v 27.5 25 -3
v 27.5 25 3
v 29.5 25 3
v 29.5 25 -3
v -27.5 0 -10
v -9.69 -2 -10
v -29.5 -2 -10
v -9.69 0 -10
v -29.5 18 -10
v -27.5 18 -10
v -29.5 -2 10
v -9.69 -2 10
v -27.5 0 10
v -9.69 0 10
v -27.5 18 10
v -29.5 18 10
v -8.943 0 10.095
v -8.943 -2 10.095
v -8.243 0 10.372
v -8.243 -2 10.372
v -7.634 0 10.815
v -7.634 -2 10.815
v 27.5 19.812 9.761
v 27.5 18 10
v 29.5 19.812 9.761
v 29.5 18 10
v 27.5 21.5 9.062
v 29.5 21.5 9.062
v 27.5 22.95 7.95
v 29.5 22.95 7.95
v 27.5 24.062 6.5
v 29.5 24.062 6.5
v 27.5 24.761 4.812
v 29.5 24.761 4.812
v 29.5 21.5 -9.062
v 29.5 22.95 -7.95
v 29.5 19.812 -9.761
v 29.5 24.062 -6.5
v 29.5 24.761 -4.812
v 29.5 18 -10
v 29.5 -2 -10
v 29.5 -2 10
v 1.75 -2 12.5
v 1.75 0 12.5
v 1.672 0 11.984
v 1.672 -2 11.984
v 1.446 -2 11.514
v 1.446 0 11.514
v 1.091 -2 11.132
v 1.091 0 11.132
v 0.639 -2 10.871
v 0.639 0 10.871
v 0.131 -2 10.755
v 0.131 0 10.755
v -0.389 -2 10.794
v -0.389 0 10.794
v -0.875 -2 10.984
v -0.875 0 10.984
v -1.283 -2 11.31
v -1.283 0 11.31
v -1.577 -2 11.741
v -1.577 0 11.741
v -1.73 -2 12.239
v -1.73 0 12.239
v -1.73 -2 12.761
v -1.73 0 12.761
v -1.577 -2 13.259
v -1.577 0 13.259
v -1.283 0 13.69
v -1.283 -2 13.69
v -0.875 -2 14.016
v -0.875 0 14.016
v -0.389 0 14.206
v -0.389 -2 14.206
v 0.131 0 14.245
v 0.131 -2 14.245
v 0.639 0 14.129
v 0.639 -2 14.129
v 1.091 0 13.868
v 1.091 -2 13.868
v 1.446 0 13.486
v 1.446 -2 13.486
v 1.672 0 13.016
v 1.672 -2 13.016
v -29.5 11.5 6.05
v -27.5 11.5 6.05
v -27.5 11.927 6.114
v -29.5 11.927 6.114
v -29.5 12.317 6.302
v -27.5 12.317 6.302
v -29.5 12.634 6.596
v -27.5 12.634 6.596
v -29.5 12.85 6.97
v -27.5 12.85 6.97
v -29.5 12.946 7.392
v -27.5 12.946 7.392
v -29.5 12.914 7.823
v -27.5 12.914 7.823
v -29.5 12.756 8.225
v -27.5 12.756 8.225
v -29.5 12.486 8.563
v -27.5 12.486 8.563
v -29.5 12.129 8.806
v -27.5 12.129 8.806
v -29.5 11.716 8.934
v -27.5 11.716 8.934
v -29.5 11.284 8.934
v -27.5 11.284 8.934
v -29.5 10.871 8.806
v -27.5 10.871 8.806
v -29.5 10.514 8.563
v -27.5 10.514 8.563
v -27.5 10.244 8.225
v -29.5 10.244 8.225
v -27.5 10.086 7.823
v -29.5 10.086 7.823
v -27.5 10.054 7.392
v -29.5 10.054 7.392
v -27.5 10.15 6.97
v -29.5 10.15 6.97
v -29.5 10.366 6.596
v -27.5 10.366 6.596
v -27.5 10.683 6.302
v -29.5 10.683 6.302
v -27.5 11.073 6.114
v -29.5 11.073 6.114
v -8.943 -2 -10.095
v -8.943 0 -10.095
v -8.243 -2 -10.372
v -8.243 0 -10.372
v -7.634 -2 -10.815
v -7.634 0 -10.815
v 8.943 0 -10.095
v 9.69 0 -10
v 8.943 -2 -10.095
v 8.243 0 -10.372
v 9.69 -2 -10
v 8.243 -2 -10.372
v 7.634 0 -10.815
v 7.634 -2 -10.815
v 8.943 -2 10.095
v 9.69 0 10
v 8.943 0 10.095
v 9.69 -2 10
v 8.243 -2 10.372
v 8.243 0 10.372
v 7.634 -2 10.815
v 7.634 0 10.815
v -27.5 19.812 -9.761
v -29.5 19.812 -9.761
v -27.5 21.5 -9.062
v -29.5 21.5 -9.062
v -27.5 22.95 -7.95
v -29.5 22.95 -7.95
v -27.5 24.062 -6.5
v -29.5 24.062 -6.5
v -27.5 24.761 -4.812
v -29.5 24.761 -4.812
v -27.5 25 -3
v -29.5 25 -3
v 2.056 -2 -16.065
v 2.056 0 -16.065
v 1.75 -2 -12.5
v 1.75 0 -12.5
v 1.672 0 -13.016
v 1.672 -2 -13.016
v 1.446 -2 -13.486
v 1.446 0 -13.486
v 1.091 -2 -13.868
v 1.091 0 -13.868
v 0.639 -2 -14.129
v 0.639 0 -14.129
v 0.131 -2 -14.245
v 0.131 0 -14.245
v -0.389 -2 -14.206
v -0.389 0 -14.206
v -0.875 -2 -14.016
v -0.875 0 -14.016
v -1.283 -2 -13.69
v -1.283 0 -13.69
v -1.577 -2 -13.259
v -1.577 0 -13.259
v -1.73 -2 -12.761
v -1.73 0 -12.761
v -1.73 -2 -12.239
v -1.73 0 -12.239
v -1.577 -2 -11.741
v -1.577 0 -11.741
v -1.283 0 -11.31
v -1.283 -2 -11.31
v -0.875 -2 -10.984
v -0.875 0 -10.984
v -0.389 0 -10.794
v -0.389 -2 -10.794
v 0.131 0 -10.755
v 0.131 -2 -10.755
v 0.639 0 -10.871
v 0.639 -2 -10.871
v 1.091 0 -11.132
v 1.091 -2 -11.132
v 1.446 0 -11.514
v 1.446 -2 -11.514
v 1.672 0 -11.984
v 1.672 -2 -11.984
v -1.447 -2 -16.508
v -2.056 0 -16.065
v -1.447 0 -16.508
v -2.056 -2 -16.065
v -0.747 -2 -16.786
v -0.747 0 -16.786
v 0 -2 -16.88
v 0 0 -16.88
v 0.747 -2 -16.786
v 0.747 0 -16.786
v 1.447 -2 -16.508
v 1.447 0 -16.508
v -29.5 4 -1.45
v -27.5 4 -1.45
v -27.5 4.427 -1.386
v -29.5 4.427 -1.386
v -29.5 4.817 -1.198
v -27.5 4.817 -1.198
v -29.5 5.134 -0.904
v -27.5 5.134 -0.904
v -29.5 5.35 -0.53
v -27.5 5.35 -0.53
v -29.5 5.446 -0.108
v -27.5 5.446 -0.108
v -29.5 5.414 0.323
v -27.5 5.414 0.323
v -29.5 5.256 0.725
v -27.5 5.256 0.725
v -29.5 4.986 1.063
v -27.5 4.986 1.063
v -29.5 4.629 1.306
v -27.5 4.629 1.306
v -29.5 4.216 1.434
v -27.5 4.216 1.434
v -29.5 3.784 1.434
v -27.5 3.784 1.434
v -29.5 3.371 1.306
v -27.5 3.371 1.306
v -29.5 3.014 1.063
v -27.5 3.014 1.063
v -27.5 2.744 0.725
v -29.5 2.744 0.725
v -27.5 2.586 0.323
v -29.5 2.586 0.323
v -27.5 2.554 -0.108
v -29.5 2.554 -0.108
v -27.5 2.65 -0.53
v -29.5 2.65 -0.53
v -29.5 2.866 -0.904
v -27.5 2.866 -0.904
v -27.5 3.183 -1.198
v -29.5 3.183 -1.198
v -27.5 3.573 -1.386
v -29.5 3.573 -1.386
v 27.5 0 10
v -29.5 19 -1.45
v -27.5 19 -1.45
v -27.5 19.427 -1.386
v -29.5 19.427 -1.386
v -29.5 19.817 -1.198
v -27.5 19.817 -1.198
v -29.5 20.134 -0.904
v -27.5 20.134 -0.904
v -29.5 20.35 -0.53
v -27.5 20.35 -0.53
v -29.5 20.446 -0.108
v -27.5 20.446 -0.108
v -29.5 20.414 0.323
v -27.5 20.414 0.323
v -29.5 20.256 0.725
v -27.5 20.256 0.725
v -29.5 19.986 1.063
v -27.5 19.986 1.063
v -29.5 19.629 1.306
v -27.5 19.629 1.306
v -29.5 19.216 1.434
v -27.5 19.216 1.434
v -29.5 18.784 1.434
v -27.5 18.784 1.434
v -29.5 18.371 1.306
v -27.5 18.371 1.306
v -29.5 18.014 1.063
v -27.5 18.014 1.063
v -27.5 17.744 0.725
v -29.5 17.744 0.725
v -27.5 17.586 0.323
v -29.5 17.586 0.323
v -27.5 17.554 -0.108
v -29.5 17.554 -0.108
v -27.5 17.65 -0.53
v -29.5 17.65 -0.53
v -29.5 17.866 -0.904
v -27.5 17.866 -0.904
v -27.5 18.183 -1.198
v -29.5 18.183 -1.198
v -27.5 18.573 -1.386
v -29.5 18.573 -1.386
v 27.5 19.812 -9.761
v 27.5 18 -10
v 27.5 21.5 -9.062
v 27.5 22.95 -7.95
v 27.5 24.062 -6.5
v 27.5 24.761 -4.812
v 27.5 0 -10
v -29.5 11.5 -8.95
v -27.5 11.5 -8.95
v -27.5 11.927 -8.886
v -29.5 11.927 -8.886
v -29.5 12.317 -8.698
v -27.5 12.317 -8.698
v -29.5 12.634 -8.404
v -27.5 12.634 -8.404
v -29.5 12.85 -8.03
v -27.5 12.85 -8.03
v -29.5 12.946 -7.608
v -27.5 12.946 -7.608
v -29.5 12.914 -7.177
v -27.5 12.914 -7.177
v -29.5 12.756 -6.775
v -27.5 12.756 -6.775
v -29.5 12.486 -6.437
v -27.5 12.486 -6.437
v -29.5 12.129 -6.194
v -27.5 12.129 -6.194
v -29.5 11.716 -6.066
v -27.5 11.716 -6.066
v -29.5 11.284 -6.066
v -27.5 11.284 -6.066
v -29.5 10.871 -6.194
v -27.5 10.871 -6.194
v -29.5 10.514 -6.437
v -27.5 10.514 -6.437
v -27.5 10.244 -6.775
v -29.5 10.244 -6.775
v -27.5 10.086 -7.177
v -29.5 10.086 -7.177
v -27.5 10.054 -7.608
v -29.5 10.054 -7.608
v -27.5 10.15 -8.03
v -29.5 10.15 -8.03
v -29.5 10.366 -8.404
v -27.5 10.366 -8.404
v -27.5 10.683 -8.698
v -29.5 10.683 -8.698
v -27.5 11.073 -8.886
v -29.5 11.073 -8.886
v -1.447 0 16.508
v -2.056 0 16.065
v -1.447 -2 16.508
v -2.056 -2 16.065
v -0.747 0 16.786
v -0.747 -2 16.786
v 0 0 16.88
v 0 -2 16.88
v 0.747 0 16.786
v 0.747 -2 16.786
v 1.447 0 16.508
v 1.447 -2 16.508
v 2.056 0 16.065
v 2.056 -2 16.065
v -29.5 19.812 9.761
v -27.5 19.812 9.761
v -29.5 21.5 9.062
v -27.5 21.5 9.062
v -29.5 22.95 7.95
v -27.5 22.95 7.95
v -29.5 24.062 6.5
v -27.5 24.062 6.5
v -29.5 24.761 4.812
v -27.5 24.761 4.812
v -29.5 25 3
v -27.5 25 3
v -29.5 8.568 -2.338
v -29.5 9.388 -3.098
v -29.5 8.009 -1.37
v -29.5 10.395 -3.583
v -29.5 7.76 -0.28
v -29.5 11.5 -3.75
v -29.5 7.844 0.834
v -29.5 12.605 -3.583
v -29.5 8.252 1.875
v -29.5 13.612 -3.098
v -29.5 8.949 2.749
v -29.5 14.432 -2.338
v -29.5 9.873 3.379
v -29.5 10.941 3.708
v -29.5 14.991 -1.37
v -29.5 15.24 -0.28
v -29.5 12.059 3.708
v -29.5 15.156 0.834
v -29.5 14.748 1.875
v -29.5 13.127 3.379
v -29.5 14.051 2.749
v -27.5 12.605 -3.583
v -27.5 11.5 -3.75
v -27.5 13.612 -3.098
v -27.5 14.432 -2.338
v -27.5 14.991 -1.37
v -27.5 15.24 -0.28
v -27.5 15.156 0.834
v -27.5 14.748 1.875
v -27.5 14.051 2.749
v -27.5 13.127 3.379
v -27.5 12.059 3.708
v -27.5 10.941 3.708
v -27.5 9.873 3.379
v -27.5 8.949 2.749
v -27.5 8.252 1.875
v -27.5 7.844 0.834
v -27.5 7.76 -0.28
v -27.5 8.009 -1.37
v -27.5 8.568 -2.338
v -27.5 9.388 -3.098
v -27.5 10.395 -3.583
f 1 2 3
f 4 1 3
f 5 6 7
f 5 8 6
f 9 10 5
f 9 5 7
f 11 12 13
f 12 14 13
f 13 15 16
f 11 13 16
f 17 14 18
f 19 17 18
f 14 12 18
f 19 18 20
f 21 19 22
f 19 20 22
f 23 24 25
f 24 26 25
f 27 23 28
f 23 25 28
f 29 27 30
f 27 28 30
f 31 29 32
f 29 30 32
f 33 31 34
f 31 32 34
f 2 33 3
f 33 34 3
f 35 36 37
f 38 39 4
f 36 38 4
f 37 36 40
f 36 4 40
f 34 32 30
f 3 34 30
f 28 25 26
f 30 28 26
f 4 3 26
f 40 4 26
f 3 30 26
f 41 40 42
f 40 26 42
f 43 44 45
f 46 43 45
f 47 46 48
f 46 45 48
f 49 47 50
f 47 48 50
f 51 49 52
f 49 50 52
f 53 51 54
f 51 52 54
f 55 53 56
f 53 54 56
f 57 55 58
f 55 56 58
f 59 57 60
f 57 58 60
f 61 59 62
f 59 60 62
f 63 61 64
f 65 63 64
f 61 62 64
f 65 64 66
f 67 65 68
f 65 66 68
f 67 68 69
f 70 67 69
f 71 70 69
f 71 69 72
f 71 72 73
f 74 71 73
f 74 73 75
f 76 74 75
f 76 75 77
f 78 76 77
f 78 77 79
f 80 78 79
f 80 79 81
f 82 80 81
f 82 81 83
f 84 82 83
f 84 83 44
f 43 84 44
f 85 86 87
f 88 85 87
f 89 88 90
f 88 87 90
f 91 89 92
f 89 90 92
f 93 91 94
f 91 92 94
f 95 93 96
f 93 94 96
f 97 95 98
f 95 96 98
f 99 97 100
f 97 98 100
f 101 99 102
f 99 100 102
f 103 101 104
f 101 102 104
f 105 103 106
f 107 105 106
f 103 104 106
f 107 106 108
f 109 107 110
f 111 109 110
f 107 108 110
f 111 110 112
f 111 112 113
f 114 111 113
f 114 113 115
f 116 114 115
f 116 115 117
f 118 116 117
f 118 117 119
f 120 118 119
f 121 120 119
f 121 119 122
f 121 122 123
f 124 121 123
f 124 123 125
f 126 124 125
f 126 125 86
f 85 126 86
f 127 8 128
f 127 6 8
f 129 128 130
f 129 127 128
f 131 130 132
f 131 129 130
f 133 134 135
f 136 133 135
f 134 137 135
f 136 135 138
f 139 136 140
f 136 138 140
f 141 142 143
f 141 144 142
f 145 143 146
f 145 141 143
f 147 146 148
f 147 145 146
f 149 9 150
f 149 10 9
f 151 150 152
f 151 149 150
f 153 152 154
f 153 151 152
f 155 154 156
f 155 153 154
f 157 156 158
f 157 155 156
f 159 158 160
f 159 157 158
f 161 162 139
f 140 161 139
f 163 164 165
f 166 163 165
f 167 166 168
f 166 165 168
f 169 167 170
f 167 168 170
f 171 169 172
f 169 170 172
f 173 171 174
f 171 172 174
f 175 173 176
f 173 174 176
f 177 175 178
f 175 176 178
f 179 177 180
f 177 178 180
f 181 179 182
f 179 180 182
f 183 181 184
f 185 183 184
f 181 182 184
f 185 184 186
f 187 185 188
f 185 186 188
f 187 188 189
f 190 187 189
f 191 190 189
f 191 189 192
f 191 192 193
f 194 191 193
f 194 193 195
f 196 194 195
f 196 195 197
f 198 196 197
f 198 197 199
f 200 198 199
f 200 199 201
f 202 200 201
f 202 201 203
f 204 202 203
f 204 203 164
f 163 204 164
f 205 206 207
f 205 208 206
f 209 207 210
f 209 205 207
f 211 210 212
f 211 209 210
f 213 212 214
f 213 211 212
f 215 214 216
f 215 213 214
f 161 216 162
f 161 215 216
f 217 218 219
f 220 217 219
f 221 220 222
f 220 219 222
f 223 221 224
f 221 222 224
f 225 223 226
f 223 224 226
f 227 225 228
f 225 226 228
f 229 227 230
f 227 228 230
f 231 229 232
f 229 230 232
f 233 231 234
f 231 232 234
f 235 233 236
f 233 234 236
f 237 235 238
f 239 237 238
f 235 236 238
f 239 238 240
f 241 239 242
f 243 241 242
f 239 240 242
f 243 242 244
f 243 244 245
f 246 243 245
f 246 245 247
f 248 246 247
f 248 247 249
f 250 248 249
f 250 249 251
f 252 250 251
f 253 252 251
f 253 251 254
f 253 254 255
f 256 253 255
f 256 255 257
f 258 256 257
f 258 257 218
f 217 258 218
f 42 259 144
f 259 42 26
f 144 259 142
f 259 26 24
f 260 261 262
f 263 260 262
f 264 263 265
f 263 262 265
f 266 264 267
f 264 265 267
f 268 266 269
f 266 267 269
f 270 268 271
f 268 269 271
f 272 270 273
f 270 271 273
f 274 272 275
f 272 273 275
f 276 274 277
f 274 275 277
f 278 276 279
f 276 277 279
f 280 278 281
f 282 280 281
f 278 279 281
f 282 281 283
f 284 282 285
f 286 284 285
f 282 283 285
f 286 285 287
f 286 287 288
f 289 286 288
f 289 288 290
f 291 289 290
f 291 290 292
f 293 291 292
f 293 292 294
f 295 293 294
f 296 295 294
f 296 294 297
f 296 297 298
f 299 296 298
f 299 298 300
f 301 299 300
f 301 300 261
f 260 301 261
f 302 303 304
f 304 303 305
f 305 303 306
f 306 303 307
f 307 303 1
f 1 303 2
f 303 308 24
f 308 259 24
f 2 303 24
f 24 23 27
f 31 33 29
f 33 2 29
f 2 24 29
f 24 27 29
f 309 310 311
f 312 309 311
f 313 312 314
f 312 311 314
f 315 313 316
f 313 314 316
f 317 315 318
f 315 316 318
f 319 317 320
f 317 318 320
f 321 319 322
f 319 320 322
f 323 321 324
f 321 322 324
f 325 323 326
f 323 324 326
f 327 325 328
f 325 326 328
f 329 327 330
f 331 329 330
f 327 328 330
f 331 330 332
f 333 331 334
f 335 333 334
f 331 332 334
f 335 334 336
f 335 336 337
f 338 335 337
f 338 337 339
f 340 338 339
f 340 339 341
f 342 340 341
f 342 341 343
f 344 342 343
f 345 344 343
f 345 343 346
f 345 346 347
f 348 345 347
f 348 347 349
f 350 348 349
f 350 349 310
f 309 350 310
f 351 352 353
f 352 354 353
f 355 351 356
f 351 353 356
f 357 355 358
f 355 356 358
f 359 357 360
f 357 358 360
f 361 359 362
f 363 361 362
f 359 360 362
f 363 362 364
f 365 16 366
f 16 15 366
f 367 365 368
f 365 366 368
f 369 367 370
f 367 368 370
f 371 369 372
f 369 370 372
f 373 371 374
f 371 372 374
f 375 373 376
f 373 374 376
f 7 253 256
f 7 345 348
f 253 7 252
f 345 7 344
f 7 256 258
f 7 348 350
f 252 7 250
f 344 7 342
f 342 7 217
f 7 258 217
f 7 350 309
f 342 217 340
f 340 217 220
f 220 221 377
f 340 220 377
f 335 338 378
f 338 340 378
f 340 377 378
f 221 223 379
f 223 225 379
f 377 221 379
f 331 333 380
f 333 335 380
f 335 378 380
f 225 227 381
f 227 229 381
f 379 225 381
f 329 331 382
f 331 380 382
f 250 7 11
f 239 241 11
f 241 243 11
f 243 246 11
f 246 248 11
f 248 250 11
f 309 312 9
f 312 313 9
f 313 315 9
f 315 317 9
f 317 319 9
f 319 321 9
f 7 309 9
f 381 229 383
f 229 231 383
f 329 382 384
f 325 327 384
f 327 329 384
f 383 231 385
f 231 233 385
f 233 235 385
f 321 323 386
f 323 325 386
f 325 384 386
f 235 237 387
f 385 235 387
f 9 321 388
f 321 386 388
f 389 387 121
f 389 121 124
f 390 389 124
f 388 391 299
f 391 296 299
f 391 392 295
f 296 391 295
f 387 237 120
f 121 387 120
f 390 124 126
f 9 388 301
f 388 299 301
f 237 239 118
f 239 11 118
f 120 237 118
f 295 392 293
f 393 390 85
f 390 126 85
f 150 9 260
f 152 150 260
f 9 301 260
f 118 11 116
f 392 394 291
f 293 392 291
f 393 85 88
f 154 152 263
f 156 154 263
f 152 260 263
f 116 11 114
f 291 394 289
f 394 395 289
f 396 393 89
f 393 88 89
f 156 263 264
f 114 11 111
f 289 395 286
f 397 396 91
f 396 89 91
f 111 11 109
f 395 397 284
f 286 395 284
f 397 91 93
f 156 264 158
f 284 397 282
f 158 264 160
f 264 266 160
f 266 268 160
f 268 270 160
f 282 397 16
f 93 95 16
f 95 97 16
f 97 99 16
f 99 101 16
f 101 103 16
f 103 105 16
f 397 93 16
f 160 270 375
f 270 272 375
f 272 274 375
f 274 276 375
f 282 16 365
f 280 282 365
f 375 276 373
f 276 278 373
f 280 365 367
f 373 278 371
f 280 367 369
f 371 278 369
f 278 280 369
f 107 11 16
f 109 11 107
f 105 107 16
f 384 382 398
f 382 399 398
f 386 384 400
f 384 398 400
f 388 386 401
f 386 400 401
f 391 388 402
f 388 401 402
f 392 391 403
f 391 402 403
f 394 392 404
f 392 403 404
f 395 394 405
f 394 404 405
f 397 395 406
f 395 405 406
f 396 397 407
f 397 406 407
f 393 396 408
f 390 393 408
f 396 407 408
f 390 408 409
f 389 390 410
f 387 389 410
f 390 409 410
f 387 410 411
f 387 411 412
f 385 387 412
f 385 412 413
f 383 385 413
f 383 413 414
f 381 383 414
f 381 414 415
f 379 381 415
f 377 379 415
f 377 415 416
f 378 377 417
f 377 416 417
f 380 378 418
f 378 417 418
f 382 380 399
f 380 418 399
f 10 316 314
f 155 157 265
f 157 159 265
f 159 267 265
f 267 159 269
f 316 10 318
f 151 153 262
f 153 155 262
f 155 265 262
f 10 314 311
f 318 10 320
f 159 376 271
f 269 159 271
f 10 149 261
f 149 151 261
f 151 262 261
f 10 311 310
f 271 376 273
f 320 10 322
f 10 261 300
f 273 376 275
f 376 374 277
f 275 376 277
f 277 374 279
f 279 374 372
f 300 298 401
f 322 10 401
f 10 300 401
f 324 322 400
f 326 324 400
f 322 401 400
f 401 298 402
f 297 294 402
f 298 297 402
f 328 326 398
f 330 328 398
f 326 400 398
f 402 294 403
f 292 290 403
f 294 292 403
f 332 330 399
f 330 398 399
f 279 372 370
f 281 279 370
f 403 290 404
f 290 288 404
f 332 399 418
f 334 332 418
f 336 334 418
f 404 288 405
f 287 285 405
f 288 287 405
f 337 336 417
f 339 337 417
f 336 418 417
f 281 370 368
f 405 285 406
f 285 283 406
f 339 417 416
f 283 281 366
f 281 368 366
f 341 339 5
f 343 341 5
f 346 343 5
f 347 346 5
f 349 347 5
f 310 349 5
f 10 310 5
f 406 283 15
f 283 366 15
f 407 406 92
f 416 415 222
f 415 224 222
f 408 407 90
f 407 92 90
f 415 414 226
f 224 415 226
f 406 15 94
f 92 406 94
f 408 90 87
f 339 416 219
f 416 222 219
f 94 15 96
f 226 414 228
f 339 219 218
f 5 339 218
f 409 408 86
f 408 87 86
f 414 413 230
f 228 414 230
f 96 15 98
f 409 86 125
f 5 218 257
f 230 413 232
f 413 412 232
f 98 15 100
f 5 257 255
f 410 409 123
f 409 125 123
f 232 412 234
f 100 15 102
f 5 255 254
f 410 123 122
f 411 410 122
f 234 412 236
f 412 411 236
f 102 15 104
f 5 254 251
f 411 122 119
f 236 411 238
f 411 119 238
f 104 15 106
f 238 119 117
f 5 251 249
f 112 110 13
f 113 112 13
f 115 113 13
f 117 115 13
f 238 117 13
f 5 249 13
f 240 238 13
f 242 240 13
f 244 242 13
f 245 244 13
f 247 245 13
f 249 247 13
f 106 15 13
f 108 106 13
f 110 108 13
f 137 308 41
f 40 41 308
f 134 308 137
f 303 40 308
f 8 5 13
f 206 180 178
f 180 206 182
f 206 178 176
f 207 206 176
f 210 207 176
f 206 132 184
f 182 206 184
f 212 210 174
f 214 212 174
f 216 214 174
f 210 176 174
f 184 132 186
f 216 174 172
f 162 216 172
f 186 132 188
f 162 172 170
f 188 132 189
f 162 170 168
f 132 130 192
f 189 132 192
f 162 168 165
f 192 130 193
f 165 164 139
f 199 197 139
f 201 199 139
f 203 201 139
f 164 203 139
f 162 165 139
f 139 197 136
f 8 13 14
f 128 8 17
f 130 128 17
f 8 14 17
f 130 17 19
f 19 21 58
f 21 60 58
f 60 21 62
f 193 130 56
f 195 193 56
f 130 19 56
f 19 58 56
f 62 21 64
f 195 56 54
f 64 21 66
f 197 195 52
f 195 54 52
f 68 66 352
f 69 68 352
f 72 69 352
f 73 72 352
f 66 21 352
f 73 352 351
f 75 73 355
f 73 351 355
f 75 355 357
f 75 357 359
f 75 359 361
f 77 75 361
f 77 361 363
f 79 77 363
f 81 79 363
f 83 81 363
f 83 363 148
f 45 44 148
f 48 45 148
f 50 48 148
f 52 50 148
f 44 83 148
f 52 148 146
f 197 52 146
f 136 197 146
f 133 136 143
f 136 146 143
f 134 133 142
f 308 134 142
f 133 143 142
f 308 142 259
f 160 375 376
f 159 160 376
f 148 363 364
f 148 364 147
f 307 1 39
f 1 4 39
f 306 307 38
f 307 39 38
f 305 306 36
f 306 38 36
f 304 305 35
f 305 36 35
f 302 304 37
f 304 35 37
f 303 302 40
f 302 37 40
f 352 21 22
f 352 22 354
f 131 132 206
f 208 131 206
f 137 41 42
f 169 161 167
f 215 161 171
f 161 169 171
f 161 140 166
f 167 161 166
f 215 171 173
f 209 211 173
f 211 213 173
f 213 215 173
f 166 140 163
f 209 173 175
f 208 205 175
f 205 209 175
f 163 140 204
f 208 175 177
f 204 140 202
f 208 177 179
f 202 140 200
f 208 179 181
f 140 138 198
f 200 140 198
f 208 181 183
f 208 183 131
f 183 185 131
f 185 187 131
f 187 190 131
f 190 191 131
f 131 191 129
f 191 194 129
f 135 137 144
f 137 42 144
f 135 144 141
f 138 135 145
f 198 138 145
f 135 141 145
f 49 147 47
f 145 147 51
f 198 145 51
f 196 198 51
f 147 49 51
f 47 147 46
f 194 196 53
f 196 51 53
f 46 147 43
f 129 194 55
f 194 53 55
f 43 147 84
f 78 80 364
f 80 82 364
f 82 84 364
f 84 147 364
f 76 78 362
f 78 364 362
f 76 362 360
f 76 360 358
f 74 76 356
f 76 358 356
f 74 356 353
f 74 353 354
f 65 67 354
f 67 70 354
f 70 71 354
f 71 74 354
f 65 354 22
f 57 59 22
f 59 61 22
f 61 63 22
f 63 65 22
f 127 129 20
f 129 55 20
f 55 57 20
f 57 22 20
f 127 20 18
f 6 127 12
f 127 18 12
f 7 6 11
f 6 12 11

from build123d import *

# Parameters (mm, degrees)
BOSS_EXTRUDE1_DEPTH = 10
FILLET1_R           = 7
SKETCH2_R           = 1.45
SKETCH2_R_2         = 3.75
CUT_EXTRUDE1_DEPTH  = 15
BOSS_EXTRUDE2_DEPTH = 2
FILLET3_R           = 3
SKETCH4_R           = 1.75
CUT_EXTRUDE2_DEPTH  = 3


with BuildPart() as part:
    # Sketch1 → Boss-Extrude1 (new body, symmetric)
    with BuildSketch(Plane.XY):
        Polygon((-27.5, 25), (-27.5, 0), (27.5, 0), (27.5, 25), (29.5, 25), (29.5, -2), (-29.5, -2), (-29.5, 25), align=None)
    extrude(amount=BOSS_EXTRUDE1_DEPTH, both=True)

    # Fillet1
    fillet1_edges = [part.edges().sort_by_distance(p)[0] for p in [
        (-28.5, 25, -10),
        (28.5, 25, 10),
        (-28.5, 25, 10),
        (28.5, 25, -10),
    ]]
    fillet(fillet1_edges, radius=FILLET1_R)

    # Sketch2 → Cut-Extrude1 (cut, symmetric)
    with BuildSketch(Plane(origin=(-27.5, 0, 0), x_dir=(0, 0, -1), z_dir=(1, 0, 0))):
        with Locations((0, 19)):
            Circle(SKETCH2_R)
        with Locations((7.5, 11.5)):
            Circle(SKETCH2_R)
        with Locations((0, 4)):
            Circle(SKETCH2_R)
        with Locations((-7.5, 11.5)):
            Circle(SKETCH2_R)
        with Locations((0, 11.5)):
            Circle(SKETCH2_R_2)
    extrude(amount=CUT_EXTRUDE1_DEPTH, both=True, mode=Mode.SUBTRACT)

    # Sketch3 → Boss-Extrude2 (add)
    with BuildSketch(Plane(origin=(0, 0, 0), x_dir=(1, 0, 0), z_dir=(0, 1, 0))):
        Polygon((-8.5, 10), (0, 18), (8.5, 10), align=None)
        Polygon((8.5, -10), (-8.5, -10), (0, -18), align=None)
    extrude(amount=-BOSS_EXTRUDE2_DEPTH)

    # Fillet3
    fillet3_edges = [part.edges().sort_by_distance(p)[0] for p in [
        (8.5, -1, -10),
        (-8.5, -1, -10),
        (0, -1, -18),
        (8.5, -1, 10),
        (0, -1, 18),
        (-8.5, -1, 10),
    ]]
    fillet(fillet3_edges, radius=FILLET3_R)

    # Sketch4 → Cut-Extrude2 (cut, through all)
    with BuildSketch(Plane(origin=(0, 0, 0), x_dir=(1, 0, 0), z_dir=(0, 1, 0))):
        with Locations((0, 12.5)):
            Circle(SKETCH4_R)
        with Locations((0, -12.5)):
            Circle(SKETCH4_R)
    extrude(amount=-CUT_EXTRUDE2_DEPTH, mode=Mode.SUBTRACT)


solid = part.part
